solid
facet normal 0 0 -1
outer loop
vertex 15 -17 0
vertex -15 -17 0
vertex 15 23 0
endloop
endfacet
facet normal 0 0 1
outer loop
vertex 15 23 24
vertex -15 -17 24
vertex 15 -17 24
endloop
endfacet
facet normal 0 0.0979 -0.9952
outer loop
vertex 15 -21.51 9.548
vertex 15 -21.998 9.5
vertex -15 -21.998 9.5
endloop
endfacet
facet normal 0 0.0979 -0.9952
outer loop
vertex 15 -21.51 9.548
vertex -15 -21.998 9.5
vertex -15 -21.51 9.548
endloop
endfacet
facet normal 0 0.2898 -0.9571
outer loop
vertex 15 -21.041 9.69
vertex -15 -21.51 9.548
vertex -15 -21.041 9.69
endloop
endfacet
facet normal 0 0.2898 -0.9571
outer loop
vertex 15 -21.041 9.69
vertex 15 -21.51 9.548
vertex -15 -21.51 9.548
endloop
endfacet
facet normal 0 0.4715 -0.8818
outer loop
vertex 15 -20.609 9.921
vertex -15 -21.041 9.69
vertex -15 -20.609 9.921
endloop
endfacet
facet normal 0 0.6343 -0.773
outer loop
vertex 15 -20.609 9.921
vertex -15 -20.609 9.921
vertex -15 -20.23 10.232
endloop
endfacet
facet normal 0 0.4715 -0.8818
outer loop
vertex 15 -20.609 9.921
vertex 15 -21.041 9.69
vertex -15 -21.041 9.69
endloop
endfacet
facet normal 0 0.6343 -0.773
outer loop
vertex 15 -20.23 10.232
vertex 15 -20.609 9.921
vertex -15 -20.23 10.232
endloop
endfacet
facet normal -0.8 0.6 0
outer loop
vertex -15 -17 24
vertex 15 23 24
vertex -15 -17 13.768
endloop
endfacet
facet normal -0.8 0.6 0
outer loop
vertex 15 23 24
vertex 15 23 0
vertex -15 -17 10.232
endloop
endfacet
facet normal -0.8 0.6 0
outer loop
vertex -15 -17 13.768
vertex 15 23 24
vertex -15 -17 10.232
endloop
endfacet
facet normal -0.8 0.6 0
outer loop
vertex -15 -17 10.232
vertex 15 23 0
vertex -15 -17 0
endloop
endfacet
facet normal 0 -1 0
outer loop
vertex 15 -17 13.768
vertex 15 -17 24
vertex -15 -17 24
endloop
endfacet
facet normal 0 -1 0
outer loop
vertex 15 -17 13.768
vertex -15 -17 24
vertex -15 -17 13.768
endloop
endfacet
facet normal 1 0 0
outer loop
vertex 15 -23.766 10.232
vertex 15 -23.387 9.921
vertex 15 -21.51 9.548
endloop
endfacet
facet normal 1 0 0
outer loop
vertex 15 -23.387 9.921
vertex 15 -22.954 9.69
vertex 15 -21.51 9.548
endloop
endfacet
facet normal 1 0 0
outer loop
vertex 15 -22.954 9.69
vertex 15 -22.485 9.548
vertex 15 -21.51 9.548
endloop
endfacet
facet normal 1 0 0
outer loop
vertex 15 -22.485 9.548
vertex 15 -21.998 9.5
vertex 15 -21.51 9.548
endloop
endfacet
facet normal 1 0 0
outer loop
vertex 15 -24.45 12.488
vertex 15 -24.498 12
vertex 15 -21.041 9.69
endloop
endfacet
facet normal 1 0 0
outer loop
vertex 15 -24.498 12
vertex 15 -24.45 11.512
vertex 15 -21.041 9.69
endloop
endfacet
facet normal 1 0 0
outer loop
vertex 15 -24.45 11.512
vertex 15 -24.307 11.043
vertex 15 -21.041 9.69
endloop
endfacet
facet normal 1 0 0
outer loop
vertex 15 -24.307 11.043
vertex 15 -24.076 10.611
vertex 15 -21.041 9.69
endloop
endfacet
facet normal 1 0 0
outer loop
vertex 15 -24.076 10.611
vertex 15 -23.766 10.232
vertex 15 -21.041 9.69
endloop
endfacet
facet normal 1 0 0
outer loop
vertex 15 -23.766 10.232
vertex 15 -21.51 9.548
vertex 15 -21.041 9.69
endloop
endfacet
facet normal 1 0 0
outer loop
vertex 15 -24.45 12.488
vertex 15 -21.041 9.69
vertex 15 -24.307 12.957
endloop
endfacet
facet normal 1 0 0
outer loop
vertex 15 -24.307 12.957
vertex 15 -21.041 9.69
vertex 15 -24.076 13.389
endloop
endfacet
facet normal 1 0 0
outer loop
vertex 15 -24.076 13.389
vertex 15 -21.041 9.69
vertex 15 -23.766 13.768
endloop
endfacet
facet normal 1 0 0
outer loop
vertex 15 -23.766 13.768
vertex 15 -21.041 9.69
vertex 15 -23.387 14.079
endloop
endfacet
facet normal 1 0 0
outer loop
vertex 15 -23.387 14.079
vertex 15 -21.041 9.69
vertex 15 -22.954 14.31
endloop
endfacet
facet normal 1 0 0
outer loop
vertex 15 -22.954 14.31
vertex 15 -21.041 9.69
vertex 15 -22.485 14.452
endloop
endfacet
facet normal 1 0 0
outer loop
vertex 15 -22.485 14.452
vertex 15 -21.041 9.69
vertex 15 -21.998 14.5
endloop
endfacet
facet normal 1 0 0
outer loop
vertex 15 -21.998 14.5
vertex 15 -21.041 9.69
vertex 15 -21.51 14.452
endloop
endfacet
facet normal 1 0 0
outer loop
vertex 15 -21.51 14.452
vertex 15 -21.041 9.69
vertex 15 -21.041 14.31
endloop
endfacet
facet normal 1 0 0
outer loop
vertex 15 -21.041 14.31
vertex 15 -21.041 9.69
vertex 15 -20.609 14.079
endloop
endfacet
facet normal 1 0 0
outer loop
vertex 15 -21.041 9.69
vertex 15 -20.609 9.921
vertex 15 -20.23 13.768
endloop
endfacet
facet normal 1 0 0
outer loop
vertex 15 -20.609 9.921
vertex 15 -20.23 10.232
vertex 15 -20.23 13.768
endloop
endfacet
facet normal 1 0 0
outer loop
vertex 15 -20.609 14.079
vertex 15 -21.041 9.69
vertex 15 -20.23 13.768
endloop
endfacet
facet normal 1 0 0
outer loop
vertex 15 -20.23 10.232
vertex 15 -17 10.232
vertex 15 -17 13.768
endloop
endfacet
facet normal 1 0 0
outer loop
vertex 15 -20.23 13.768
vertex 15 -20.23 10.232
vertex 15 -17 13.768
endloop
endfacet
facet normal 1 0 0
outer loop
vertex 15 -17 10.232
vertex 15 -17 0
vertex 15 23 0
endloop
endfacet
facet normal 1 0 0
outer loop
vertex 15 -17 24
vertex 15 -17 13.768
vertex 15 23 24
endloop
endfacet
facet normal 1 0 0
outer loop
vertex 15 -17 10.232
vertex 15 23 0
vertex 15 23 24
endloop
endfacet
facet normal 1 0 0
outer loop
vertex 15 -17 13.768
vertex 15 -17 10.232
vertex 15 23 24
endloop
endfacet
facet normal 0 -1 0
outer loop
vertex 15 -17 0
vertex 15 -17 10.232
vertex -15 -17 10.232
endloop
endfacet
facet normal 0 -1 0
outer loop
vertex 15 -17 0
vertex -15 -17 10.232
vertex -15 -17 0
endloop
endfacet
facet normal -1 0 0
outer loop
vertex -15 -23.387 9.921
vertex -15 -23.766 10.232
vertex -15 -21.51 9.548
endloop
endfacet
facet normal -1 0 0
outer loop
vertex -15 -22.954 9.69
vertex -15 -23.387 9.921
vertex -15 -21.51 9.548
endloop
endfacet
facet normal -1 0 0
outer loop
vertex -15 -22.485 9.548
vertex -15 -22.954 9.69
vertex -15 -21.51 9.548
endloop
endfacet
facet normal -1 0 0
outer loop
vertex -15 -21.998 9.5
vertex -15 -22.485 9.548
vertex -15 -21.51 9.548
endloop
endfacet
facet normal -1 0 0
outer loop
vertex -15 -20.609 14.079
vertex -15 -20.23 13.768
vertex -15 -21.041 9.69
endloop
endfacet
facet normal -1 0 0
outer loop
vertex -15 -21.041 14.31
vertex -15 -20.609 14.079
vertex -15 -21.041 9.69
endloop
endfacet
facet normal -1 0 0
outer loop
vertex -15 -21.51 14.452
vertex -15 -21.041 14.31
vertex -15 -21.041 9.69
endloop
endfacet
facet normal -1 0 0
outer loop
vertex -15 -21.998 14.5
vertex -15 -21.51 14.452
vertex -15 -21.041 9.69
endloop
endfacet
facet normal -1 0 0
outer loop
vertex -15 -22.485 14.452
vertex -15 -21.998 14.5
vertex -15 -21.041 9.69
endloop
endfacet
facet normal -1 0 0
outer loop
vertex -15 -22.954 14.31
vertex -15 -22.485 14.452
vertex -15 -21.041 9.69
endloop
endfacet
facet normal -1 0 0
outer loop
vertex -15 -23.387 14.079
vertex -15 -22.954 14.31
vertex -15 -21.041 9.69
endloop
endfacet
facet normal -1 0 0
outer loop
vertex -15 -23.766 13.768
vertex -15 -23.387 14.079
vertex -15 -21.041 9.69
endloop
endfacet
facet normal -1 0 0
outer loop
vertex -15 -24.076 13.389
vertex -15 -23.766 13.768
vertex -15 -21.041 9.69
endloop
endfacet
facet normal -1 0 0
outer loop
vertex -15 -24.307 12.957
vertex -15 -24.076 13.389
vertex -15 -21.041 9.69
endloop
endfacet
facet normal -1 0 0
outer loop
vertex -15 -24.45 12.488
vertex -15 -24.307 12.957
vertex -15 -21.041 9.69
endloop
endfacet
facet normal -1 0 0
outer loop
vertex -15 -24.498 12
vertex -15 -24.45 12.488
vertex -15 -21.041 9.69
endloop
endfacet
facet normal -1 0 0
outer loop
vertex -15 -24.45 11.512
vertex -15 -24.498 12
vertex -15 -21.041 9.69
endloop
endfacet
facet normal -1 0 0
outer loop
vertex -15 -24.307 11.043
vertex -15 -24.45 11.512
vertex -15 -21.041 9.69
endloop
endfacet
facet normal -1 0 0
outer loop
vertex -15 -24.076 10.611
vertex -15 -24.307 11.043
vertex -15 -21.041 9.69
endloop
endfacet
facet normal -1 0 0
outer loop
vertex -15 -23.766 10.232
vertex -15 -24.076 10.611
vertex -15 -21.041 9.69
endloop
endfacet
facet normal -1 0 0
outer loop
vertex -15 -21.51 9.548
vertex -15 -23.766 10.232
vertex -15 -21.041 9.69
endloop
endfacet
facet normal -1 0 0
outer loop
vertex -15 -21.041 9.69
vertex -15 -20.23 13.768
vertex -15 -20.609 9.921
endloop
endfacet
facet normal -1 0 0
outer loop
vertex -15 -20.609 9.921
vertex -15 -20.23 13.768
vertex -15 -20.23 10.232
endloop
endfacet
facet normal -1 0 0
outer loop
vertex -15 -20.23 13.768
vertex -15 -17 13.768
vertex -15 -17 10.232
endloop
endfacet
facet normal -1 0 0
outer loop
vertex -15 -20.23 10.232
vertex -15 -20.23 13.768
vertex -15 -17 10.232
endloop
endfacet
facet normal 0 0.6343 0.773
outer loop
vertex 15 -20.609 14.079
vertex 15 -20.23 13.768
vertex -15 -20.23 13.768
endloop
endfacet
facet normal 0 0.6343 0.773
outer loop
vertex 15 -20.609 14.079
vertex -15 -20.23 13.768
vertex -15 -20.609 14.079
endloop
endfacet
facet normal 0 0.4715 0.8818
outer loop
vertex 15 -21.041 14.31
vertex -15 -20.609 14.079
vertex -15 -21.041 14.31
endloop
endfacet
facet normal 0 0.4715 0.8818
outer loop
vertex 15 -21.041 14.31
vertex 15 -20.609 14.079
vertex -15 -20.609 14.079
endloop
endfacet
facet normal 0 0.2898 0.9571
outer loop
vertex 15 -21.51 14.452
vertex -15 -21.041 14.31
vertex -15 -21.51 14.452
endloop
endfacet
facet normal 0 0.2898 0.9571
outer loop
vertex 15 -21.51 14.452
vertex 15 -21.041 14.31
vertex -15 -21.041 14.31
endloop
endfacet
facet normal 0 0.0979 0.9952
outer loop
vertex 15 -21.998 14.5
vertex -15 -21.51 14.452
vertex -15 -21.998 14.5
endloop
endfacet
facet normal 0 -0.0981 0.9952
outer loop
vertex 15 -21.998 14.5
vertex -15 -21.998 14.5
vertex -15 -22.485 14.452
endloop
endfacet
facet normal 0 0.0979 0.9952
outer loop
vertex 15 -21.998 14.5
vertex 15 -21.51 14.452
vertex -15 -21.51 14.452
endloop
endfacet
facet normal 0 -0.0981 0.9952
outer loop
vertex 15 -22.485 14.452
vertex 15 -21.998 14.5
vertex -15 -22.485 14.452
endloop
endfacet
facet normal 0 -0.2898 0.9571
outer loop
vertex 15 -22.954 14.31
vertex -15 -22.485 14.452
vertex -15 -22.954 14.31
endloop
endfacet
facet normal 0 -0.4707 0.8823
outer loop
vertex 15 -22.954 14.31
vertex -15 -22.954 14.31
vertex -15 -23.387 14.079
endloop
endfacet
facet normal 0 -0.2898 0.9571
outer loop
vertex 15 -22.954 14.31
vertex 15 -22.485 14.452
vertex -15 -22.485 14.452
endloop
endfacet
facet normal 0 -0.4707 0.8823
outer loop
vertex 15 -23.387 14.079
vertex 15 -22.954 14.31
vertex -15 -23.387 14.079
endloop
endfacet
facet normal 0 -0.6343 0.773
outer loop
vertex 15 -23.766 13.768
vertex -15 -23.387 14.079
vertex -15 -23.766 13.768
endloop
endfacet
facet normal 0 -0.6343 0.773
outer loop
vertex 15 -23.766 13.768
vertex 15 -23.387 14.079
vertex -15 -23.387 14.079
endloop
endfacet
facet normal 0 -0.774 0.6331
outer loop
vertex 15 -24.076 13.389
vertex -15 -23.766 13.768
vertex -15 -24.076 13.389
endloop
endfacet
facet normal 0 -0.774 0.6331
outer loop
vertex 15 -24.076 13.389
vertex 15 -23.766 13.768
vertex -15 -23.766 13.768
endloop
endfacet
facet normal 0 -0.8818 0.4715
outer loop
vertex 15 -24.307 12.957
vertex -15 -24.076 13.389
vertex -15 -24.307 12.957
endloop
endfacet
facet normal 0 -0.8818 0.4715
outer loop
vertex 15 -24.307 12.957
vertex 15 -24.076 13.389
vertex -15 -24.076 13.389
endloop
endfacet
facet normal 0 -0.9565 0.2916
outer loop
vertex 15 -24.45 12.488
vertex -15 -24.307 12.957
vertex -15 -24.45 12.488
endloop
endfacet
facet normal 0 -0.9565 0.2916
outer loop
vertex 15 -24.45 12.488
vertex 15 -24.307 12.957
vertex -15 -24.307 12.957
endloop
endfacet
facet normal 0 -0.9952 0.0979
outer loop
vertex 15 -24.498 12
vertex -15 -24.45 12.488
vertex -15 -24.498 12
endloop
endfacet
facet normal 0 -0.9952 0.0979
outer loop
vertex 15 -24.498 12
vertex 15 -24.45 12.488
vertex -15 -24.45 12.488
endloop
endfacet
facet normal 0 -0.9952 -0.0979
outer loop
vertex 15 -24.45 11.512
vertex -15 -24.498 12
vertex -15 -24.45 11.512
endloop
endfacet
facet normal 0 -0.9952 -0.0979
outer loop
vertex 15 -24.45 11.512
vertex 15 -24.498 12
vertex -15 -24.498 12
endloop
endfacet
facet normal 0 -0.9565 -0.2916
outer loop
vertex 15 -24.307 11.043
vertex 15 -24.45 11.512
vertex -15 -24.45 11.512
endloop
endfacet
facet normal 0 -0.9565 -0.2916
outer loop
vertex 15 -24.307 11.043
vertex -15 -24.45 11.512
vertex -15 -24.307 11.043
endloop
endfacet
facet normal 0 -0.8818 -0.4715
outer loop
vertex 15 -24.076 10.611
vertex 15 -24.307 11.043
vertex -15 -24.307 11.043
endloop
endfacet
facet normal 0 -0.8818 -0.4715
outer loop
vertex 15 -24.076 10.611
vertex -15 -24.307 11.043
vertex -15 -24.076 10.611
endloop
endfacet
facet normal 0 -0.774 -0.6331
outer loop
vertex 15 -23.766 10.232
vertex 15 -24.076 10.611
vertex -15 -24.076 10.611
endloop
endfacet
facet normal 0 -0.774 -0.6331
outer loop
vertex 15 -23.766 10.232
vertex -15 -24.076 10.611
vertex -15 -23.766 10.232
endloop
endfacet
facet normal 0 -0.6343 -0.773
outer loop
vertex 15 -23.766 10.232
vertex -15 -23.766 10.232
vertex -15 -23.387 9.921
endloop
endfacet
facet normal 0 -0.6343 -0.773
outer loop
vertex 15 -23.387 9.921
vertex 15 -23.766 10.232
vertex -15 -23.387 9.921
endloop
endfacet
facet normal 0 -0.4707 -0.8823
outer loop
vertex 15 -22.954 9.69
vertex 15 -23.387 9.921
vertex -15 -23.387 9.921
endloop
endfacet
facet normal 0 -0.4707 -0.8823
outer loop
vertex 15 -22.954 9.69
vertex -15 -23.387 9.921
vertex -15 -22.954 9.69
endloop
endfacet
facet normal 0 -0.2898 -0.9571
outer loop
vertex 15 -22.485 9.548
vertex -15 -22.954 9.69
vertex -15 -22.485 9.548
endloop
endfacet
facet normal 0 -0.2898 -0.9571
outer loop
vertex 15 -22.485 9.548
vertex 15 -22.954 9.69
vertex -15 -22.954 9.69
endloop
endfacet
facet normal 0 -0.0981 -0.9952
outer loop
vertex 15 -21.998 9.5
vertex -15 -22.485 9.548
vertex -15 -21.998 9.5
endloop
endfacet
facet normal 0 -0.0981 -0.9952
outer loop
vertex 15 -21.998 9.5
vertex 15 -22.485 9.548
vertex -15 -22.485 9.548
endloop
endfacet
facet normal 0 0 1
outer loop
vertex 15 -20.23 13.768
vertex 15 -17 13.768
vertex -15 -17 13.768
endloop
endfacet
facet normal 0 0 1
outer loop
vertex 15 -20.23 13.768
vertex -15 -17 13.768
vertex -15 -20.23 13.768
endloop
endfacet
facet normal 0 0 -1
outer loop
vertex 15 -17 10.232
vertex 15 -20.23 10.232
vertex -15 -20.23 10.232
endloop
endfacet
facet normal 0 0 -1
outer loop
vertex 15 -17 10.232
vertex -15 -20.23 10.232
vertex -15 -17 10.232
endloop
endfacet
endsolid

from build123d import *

# Parameters (mm, degrees)
SKETCH_1_W          = 30
SKETCH_1_H          = 6
EXTRUDE_1_DEPTH     = 24
SKETCH_2_W          = 16
SKETCH_2_H          = 6
CUT_EXTRUDE_1_DEPTH = 45.777226354
SKETCH_3_W          = 4
SKETCH_3_H          = 4
EXTRUDE_2_DEPTH     = 30
SKETCH_4_W          = 26
SKETCH_4_H          = 4
EXTRUDE_3_DEPTH     = 10
SKETCH_5_W          = 4
SKETCH_5_H          = 10
CUT_EXTRUDE_3_DEPTH = 47.957427527
SKETCH_6_W          = 4
SKETCH_6_H          = 10
CUT_EXTRUDE_5_DEPTH = 47.957427527
SKETCH_7_R          = 4
EXTRUDE_5_DEPTH     = 30
SKETCH_8_R          = 4
CUT_EXTRUDE_6_DEPTH = 4
SKETCH_9_R          = 4
CUT_EXTRUDE_7_DEPTH = 44.324358045
SKETCH_10_W         = 3.23
SKETCH_10_H         = 3.54
EXTRUDE_6_DEPTH     = 30
SKETCH_11_W         = 3.23
SKETCH_11_H         = 3.54
CUT_EXTRUDE_8_DEPTH = 45.777226354
EXTRUDE_7_DEPTH     = 30


with BuildPart() as part:
    # 草图1 → 凸台-拉伸1 (new body)
    with BuildSketch(Plane.XY):
        Polygon((15, 23), (-15, -17), (15, -17), align=None)
        with Locations((0, -20)):
            Rectangle(SKETCH_1_W, SKETCH_1_H)
    extrude(amount=EXTRUDE_1_DEPTH)

    # 草图2 → 切除-拉伸1 (cut, through all)
    with BuildSketch(Plane.ZY.offset(15)):
        with Locations((12, -20)):
            Rectangle(SKETCH_2_W, SKETCH_2_H)
    extrude(amount=-CUT_EXTRUDE_1_DEPTH, mode=Mode.SUBTRACT)

    # 草图3 → 凸台-拉伸2 (add)
    with BuildSketch(Plane.ZY.offset(15)):
        with Locations((2, -25)):
            Rectangle(SKETCH_3_W, SKETCH_3_H)
        with Locations((22, -25)):
            Rectangle(SKETCH_3_W, SKETCH_3_H)
    extrude(amount=-EXTRUDE_2_DEPTH)

    # 草图4 → 凸台-拉伸3 (add)
    with BuildSketch(Plane.XZ.offset(17)):
        with Locations((-2, 12)):
            Rectangle(SKETCH_4_W, SKETCH_4_H)
    extrude(amount=EXTRUDE_3_DEPTH)

    # 草图5 → 切除-拉伸3 (cut, through all)
    with BuildSketch(Plane(origin=(15, 0, 0), x_dir=(0, 0, -1), z_dir=(1, 0, 0))):
        with Locations((-2, -22)):
            Rectangle(SKETCH_5_W, SKETCH_5_H)
        with Locations((-22, -22)):
            Rectangle(SKETCH_5_W, SKETCH_5_H)
    extrude(amount=-CUT_EXTRUDE_3_DEPTH, mode=Mode.SUBTRACT)

    # 草图6 → 切除-拉伸5 (cut, through all)
    with BuildSketch(Plane.ZY.offset(15)):
        with Locations((12, -22)):
            Rectangle(SKETCH_6_W, SKETCH_6_H)
    extrude(amount=-CUT_EXTRUDE_5_DEPTH, mode=Mode.SUBTRACT)

    # 草图10 → 凸台-拉伸6 (add)
    with BuildSketch(Plane(origin=(15, 0, 0), x_dir=(0, 0, -1), z_dir=(1, 0, 0))):
        with Locations((-12, -18.77)):
            Rectangle(SKETCH_10_W, SKETCH_10_H)
    extrude(amount=-EXTRUDE_6_DEPTH)

    # 草图11 → 切除-拉伸8 (cut, through all)
    with BuildSketch(Plane(origin=(15, 0, 0), x_dir=(0, 0, -1), z_dir=(1, 0, 0))):
        with Locations((-12, -18.77)):
            Rectangle(SKETCH_11_W, SKETCH_11_H)
    extrude(amount=-CUT_EXTRUDE_8_DEPTH, mode=Mode.SUBTRACT)

    # 草图12 → 凸台-拉伸7 (add)
    with BuildSketch(Plane(origin=(15, 0, 0), x_dir=(0, 0, -1), z_dir=(1, 0, 0))):
        Polygon((-13.767766953, -20.23), (-12, -21.997766953), (-10.232233047, -20.23), align=None)
        with BuildLine():
            Line((-10.232233047, -20.23), (-12, -21.997766953))
            Line((-12, -21.997766953), (-13.767766953, -20.23))
            ThreePointArc((-13.767766953, -20.23), (-12.956708581, -24.307465784), (-9.5, -21.997766953))
            ThreePointArc((-9.5, -21.997766953), (-9.690301169, -21.041058372), (-10.232233047, -20.23))
        make_face()
        with BuildLine():
            ThreePointArc((-13.767766953, -20.23), (-12, -19.497766953), (-10.232233047, -20.23))
            Line((-10.232233047, -20.23), (-10.232233047, -17))
            Line((-10.232233047, -17), (-13.767766953, -17))
            Line((-13.767766953, -17), (-13.767766953, -20.23))
        make_face()
        with BuildLine():
            Line((-13.767766953, -20.23), (-10.232233047, -20.23))
            ThreePointArc((-10.232233047, -20.23), (-12, -19.497766953), (-13.767766953, -20.23))
        make_face()
    extrude(amount=-EXTRUDE_7_DEPTH)


with BuildPart() as body_2:
    # 草图7 → 凸台-拉伸5 (new body)
    with BuildSketch(Plane(origin=(15, 0, 0), x_dir=(0, 0, -1), z_dir=(1, 0, 0))):
        with Locations((-12, -21)):
            Circle(SKETCH_7_R)
    extrude(amount=-EXTRUDE_5_DEPTH)

    # 草图8 → 切除-拉伸6 (cut)
    with BuildSketch(Plane(origin=(15, 0, 0), x_dir=(0, 0, -1), z_dir=(1, 0, 0))):
        with Locations((-12, -21)):
            Circle(SKETCH_8_R)
    extrude(amount=-CUT_EXTRUDE_6_DEPTH, mode=Mode.SUBTRACT)

    # 草图9 → 切除-拉伸7 (cut, through all)
    with BuildSketch(Plane(origin=(11, 0, 0), x_dir=(0, 0, -1), z_dir=(1, 0, 0))):
        with Locations((-12, -21)):
            Circle(SKETCH_9_R)
    extrude(amount=-CUT_EXTRUDE_7_DEPTH, mode=Mode.SUBTRACT)


solid = part.part
